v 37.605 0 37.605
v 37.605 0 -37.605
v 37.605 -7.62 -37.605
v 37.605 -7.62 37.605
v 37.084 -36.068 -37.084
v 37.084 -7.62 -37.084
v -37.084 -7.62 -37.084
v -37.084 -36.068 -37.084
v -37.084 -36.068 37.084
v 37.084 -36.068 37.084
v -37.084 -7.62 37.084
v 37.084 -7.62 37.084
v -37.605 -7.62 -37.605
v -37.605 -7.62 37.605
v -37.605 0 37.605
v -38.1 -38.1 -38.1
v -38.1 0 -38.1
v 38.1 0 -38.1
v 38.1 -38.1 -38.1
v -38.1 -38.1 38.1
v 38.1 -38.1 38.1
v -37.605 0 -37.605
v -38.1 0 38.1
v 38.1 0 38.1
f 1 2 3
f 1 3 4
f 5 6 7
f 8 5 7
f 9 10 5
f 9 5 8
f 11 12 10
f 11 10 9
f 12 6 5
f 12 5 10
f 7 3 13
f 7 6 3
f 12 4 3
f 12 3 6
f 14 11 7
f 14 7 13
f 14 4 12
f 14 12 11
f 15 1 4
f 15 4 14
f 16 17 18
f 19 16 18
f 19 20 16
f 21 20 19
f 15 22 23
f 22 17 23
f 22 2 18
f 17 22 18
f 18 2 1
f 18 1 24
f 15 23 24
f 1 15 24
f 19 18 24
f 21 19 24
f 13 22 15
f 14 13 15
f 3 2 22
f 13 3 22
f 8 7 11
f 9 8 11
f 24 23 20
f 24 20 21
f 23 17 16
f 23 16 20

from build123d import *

# Parameters (mm, degrees)
F0_W     = 76.2
F0_H     = 76.2
F1_DEPTH = 38.1
F2_W     = 74.168
F2_H     = 74.168
F3_DEPTH = 36.068
F4_W     = 75.2094
F4_H     = 75.2094
F4_W_2   = 74.168
F4_H_2   = 74.168
F5_DEPTH = 7.62


with BuildPart() as f1:
    # F0 (on Front) → F1 (new body)
    with BuildSketch(Plane.XZ):
        Rectangle(F0_W, F0_H)
    extrude(amount=F1_DEPTH)

    # F2 (on face) → F3 (cut)
    with BuildSketch(Plane(origin=(0, 0, 0), x_dir=(-1, 0, 0), z_dir=(0, 1, 0))):
        Rectangle(F2_W, F2_H)
    extrude(amount=-F3_DEPTH, mode=Mode.SUBTRACT)

    # F4 (on face) → F5 (cut)
    with BuildSketch(Plane(origin=(0, 0, 0), x_dir=(-1, 0, 0), z_dir=(0, 1, 0))):
        Rectangle(F4_W, F4_H)
        Rectangle(F4_W_2, F4_H_2, mode=Mode.SUBTRACT)
    extrude(amount=-F5_DEPTH, mode=Mode.SUBTRACT)


solid = f1.part
